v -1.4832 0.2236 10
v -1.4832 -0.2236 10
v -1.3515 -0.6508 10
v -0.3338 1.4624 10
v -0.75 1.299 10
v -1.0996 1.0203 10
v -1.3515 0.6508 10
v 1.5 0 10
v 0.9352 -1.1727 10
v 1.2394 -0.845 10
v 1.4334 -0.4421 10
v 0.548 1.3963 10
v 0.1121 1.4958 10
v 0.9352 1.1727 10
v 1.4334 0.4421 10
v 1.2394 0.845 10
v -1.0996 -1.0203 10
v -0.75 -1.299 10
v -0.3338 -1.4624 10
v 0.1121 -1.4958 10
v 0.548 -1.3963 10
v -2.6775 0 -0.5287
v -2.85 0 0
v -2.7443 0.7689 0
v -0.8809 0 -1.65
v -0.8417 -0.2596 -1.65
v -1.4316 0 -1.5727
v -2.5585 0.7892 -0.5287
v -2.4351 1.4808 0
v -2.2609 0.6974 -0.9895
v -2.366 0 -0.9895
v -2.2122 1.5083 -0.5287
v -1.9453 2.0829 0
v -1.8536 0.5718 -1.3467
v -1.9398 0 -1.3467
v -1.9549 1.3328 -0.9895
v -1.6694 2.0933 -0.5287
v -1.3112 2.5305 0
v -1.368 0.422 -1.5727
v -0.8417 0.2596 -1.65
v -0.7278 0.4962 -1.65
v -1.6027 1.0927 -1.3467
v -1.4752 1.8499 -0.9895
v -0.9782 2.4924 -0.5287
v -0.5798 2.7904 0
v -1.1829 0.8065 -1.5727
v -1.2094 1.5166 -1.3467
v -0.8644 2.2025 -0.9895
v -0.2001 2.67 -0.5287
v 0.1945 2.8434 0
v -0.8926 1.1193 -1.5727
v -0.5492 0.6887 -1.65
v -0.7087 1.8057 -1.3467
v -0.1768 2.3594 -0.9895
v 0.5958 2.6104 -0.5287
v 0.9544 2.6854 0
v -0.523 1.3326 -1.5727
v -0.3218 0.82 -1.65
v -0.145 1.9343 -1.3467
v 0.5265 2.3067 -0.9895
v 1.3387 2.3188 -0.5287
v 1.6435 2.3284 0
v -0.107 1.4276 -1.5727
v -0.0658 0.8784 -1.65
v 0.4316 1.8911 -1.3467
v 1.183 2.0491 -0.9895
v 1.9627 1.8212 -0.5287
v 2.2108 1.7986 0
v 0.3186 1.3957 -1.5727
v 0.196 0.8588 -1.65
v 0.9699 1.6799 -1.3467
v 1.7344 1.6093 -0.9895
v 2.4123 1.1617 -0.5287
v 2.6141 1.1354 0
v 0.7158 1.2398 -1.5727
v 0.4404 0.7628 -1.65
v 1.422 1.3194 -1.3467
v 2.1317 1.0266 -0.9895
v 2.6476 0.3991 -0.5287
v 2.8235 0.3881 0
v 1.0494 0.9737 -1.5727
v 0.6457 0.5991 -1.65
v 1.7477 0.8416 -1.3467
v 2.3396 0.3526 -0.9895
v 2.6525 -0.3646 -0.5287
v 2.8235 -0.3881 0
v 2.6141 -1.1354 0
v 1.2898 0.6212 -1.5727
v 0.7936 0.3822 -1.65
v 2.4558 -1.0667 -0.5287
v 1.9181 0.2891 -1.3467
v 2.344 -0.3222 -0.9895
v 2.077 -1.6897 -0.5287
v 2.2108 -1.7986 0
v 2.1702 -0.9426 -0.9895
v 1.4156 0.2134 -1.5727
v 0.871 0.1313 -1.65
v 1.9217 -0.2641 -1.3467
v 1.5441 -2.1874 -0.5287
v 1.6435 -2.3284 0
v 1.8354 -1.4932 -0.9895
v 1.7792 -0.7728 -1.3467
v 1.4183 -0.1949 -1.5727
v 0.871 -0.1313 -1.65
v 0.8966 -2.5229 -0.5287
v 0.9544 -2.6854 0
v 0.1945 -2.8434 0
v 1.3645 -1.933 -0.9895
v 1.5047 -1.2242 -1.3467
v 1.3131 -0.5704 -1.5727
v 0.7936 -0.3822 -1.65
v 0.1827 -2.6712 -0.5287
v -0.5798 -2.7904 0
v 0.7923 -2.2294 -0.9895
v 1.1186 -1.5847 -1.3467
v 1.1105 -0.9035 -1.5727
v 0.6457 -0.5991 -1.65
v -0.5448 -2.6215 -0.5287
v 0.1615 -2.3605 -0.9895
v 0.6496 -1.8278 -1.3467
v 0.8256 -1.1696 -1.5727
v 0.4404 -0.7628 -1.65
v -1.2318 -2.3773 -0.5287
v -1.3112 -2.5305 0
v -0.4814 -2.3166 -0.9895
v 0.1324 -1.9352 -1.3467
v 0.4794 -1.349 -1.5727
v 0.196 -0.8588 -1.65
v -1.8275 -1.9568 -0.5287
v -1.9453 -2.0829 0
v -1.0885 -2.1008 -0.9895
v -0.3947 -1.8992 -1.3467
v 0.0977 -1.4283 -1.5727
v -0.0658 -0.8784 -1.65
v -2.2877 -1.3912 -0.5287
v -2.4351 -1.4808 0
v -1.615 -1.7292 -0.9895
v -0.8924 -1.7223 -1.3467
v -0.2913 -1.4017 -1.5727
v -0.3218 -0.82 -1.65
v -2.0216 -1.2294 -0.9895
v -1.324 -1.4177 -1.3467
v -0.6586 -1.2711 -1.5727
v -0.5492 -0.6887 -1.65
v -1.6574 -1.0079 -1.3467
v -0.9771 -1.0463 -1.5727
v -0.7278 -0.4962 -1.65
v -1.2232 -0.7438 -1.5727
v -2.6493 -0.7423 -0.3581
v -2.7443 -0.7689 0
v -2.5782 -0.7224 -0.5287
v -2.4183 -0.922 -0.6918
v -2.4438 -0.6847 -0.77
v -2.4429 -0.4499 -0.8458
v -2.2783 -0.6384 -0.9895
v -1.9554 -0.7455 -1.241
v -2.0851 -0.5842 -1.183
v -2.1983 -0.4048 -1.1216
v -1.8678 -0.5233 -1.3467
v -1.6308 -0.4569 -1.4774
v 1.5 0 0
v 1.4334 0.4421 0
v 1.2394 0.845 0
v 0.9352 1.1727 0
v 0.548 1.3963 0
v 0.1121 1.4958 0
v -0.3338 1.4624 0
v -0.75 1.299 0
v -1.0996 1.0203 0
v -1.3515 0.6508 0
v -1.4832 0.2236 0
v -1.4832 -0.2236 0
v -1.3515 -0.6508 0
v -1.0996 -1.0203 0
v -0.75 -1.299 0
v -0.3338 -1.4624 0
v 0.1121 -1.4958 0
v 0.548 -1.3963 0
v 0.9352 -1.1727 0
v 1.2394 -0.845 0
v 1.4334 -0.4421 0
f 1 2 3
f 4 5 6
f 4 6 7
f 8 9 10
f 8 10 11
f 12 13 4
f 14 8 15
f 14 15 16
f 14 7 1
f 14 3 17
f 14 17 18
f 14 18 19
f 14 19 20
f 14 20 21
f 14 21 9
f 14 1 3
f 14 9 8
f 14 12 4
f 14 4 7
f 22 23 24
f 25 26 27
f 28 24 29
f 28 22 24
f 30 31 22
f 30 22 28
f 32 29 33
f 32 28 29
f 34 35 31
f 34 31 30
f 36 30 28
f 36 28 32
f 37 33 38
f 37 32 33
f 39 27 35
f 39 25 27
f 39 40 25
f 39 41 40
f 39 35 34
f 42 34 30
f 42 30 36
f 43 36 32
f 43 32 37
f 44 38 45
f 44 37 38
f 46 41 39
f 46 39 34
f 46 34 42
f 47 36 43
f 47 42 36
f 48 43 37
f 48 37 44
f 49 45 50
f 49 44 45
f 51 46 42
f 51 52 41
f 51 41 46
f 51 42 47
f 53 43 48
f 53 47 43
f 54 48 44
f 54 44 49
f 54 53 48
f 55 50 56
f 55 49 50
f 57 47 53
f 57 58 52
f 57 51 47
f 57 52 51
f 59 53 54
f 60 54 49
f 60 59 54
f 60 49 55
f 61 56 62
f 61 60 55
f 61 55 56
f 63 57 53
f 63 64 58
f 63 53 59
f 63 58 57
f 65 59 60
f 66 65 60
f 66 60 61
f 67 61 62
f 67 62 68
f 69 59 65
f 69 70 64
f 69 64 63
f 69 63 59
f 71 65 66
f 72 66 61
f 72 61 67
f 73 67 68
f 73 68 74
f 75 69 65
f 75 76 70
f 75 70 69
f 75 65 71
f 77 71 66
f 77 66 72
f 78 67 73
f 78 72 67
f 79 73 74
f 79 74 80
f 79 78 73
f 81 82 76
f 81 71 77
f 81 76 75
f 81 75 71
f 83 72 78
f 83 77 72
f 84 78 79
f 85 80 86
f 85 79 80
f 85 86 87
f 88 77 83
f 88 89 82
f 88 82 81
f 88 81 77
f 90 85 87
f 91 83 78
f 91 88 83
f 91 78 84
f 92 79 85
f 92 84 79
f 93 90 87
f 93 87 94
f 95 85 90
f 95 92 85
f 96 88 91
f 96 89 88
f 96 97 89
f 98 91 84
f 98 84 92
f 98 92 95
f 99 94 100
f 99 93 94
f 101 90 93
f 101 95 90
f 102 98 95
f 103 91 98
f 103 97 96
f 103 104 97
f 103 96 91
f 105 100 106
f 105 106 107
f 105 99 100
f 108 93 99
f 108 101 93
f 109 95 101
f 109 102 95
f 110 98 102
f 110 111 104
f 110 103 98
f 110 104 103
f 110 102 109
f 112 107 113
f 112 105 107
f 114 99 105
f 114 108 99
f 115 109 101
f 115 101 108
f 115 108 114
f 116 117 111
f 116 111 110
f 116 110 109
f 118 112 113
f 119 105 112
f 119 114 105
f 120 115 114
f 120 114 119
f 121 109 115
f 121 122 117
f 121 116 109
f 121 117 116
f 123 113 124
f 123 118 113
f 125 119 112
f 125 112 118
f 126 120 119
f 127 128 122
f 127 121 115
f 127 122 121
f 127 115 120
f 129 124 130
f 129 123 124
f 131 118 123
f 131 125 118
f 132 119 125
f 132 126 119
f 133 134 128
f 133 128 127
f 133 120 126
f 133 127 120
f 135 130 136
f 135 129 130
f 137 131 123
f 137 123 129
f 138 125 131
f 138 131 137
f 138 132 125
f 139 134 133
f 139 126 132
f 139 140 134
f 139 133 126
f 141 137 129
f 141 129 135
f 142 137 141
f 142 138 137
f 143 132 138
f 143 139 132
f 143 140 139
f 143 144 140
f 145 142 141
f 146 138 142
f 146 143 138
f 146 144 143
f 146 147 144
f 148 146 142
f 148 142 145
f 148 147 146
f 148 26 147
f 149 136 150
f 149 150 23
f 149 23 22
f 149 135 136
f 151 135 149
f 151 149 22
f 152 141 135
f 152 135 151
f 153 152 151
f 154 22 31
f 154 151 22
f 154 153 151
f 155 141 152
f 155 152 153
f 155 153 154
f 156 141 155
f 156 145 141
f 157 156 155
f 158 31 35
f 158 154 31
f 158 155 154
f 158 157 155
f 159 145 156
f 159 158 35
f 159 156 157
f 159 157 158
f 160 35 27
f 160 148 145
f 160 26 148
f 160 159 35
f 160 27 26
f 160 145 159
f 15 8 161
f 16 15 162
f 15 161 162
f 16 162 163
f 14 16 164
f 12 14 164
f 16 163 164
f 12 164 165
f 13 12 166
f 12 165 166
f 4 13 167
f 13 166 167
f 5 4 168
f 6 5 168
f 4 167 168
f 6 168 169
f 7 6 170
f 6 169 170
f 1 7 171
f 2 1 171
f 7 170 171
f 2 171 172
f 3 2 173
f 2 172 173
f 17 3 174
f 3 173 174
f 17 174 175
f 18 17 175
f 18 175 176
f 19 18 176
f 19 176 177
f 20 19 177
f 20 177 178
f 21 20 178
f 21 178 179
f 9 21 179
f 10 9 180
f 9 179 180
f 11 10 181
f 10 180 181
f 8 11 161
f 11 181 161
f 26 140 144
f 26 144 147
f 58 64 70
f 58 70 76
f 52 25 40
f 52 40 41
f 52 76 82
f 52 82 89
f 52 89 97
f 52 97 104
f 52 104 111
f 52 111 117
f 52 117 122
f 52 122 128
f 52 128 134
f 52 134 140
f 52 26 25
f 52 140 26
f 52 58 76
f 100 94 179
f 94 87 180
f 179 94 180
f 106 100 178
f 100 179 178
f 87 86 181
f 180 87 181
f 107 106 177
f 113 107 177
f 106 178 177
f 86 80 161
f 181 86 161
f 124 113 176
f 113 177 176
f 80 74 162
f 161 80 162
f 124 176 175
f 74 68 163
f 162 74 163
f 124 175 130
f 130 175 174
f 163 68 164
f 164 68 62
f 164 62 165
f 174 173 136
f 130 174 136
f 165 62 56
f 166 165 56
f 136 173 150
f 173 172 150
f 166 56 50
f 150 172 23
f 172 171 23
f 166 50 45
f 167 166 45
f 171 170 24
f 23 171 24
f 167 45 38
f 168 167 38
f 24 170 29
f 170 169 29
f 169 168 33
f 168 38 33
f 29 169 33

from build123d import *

# Parameters (mm, degrees)
SKETCH_1_R      = 1.5
EXTRUDE_1_DEPTH = 10
SKETCH_2_R      = 2.85
EXTRUDE_2_DEPTH = 1.65
FILLET_1_R      = 2


with BuildPart() as part:
    # 草图1 → 凸台-拉伸1 (new body)
    with BuildSketch(Plane.XY):
        Circle(SKETCH_1_R)
    extrude(amount=EXTRUDE_1_DEPTH)

    # 草图2 → 凸台-拉伸2 (add)
    with BuildSketch(Plane(origin=(0, 0, 0), x_dir=(-1, 0, 0), z_dir=(0, 0, -1))):
        Circle(SKETCH_2_R)
    extrude(amount=EXTRUDE_2_DEPTH)

    # 圆角1
    # the kernel refuses this fillet: 2 mm, written as the material it takes off along each edge
    with BuildSketch(Plane(origin=(0, 0, -1.65), x_dir=(-1, 0, 0), z_dir=(0, -1, 0))) as fillet_1_piece_1:
        with BuildLine():
            CenterArc((0.880863133, -2), FILLET_1_R, 10.078658108, 79.921341892)
            Line((0.880863133, 0), (0.880863133, 0.04))
            Line((0.880863133, 0.04), (2.85, 0.04))
            Line((2.85, 0.04), (2.89, 0))
            ThreePointArc((2.89, 0), (2.89, -0.825), (2.889382737, -1.643))
            Line((2.889382737, -1.643), (2.85, -1.65))
        make_face()
    revolve(axis=Axis((0, 0, -1.65), (0, 0, -1)), mode=Mode.SUBTRACT)


solid = part.part
